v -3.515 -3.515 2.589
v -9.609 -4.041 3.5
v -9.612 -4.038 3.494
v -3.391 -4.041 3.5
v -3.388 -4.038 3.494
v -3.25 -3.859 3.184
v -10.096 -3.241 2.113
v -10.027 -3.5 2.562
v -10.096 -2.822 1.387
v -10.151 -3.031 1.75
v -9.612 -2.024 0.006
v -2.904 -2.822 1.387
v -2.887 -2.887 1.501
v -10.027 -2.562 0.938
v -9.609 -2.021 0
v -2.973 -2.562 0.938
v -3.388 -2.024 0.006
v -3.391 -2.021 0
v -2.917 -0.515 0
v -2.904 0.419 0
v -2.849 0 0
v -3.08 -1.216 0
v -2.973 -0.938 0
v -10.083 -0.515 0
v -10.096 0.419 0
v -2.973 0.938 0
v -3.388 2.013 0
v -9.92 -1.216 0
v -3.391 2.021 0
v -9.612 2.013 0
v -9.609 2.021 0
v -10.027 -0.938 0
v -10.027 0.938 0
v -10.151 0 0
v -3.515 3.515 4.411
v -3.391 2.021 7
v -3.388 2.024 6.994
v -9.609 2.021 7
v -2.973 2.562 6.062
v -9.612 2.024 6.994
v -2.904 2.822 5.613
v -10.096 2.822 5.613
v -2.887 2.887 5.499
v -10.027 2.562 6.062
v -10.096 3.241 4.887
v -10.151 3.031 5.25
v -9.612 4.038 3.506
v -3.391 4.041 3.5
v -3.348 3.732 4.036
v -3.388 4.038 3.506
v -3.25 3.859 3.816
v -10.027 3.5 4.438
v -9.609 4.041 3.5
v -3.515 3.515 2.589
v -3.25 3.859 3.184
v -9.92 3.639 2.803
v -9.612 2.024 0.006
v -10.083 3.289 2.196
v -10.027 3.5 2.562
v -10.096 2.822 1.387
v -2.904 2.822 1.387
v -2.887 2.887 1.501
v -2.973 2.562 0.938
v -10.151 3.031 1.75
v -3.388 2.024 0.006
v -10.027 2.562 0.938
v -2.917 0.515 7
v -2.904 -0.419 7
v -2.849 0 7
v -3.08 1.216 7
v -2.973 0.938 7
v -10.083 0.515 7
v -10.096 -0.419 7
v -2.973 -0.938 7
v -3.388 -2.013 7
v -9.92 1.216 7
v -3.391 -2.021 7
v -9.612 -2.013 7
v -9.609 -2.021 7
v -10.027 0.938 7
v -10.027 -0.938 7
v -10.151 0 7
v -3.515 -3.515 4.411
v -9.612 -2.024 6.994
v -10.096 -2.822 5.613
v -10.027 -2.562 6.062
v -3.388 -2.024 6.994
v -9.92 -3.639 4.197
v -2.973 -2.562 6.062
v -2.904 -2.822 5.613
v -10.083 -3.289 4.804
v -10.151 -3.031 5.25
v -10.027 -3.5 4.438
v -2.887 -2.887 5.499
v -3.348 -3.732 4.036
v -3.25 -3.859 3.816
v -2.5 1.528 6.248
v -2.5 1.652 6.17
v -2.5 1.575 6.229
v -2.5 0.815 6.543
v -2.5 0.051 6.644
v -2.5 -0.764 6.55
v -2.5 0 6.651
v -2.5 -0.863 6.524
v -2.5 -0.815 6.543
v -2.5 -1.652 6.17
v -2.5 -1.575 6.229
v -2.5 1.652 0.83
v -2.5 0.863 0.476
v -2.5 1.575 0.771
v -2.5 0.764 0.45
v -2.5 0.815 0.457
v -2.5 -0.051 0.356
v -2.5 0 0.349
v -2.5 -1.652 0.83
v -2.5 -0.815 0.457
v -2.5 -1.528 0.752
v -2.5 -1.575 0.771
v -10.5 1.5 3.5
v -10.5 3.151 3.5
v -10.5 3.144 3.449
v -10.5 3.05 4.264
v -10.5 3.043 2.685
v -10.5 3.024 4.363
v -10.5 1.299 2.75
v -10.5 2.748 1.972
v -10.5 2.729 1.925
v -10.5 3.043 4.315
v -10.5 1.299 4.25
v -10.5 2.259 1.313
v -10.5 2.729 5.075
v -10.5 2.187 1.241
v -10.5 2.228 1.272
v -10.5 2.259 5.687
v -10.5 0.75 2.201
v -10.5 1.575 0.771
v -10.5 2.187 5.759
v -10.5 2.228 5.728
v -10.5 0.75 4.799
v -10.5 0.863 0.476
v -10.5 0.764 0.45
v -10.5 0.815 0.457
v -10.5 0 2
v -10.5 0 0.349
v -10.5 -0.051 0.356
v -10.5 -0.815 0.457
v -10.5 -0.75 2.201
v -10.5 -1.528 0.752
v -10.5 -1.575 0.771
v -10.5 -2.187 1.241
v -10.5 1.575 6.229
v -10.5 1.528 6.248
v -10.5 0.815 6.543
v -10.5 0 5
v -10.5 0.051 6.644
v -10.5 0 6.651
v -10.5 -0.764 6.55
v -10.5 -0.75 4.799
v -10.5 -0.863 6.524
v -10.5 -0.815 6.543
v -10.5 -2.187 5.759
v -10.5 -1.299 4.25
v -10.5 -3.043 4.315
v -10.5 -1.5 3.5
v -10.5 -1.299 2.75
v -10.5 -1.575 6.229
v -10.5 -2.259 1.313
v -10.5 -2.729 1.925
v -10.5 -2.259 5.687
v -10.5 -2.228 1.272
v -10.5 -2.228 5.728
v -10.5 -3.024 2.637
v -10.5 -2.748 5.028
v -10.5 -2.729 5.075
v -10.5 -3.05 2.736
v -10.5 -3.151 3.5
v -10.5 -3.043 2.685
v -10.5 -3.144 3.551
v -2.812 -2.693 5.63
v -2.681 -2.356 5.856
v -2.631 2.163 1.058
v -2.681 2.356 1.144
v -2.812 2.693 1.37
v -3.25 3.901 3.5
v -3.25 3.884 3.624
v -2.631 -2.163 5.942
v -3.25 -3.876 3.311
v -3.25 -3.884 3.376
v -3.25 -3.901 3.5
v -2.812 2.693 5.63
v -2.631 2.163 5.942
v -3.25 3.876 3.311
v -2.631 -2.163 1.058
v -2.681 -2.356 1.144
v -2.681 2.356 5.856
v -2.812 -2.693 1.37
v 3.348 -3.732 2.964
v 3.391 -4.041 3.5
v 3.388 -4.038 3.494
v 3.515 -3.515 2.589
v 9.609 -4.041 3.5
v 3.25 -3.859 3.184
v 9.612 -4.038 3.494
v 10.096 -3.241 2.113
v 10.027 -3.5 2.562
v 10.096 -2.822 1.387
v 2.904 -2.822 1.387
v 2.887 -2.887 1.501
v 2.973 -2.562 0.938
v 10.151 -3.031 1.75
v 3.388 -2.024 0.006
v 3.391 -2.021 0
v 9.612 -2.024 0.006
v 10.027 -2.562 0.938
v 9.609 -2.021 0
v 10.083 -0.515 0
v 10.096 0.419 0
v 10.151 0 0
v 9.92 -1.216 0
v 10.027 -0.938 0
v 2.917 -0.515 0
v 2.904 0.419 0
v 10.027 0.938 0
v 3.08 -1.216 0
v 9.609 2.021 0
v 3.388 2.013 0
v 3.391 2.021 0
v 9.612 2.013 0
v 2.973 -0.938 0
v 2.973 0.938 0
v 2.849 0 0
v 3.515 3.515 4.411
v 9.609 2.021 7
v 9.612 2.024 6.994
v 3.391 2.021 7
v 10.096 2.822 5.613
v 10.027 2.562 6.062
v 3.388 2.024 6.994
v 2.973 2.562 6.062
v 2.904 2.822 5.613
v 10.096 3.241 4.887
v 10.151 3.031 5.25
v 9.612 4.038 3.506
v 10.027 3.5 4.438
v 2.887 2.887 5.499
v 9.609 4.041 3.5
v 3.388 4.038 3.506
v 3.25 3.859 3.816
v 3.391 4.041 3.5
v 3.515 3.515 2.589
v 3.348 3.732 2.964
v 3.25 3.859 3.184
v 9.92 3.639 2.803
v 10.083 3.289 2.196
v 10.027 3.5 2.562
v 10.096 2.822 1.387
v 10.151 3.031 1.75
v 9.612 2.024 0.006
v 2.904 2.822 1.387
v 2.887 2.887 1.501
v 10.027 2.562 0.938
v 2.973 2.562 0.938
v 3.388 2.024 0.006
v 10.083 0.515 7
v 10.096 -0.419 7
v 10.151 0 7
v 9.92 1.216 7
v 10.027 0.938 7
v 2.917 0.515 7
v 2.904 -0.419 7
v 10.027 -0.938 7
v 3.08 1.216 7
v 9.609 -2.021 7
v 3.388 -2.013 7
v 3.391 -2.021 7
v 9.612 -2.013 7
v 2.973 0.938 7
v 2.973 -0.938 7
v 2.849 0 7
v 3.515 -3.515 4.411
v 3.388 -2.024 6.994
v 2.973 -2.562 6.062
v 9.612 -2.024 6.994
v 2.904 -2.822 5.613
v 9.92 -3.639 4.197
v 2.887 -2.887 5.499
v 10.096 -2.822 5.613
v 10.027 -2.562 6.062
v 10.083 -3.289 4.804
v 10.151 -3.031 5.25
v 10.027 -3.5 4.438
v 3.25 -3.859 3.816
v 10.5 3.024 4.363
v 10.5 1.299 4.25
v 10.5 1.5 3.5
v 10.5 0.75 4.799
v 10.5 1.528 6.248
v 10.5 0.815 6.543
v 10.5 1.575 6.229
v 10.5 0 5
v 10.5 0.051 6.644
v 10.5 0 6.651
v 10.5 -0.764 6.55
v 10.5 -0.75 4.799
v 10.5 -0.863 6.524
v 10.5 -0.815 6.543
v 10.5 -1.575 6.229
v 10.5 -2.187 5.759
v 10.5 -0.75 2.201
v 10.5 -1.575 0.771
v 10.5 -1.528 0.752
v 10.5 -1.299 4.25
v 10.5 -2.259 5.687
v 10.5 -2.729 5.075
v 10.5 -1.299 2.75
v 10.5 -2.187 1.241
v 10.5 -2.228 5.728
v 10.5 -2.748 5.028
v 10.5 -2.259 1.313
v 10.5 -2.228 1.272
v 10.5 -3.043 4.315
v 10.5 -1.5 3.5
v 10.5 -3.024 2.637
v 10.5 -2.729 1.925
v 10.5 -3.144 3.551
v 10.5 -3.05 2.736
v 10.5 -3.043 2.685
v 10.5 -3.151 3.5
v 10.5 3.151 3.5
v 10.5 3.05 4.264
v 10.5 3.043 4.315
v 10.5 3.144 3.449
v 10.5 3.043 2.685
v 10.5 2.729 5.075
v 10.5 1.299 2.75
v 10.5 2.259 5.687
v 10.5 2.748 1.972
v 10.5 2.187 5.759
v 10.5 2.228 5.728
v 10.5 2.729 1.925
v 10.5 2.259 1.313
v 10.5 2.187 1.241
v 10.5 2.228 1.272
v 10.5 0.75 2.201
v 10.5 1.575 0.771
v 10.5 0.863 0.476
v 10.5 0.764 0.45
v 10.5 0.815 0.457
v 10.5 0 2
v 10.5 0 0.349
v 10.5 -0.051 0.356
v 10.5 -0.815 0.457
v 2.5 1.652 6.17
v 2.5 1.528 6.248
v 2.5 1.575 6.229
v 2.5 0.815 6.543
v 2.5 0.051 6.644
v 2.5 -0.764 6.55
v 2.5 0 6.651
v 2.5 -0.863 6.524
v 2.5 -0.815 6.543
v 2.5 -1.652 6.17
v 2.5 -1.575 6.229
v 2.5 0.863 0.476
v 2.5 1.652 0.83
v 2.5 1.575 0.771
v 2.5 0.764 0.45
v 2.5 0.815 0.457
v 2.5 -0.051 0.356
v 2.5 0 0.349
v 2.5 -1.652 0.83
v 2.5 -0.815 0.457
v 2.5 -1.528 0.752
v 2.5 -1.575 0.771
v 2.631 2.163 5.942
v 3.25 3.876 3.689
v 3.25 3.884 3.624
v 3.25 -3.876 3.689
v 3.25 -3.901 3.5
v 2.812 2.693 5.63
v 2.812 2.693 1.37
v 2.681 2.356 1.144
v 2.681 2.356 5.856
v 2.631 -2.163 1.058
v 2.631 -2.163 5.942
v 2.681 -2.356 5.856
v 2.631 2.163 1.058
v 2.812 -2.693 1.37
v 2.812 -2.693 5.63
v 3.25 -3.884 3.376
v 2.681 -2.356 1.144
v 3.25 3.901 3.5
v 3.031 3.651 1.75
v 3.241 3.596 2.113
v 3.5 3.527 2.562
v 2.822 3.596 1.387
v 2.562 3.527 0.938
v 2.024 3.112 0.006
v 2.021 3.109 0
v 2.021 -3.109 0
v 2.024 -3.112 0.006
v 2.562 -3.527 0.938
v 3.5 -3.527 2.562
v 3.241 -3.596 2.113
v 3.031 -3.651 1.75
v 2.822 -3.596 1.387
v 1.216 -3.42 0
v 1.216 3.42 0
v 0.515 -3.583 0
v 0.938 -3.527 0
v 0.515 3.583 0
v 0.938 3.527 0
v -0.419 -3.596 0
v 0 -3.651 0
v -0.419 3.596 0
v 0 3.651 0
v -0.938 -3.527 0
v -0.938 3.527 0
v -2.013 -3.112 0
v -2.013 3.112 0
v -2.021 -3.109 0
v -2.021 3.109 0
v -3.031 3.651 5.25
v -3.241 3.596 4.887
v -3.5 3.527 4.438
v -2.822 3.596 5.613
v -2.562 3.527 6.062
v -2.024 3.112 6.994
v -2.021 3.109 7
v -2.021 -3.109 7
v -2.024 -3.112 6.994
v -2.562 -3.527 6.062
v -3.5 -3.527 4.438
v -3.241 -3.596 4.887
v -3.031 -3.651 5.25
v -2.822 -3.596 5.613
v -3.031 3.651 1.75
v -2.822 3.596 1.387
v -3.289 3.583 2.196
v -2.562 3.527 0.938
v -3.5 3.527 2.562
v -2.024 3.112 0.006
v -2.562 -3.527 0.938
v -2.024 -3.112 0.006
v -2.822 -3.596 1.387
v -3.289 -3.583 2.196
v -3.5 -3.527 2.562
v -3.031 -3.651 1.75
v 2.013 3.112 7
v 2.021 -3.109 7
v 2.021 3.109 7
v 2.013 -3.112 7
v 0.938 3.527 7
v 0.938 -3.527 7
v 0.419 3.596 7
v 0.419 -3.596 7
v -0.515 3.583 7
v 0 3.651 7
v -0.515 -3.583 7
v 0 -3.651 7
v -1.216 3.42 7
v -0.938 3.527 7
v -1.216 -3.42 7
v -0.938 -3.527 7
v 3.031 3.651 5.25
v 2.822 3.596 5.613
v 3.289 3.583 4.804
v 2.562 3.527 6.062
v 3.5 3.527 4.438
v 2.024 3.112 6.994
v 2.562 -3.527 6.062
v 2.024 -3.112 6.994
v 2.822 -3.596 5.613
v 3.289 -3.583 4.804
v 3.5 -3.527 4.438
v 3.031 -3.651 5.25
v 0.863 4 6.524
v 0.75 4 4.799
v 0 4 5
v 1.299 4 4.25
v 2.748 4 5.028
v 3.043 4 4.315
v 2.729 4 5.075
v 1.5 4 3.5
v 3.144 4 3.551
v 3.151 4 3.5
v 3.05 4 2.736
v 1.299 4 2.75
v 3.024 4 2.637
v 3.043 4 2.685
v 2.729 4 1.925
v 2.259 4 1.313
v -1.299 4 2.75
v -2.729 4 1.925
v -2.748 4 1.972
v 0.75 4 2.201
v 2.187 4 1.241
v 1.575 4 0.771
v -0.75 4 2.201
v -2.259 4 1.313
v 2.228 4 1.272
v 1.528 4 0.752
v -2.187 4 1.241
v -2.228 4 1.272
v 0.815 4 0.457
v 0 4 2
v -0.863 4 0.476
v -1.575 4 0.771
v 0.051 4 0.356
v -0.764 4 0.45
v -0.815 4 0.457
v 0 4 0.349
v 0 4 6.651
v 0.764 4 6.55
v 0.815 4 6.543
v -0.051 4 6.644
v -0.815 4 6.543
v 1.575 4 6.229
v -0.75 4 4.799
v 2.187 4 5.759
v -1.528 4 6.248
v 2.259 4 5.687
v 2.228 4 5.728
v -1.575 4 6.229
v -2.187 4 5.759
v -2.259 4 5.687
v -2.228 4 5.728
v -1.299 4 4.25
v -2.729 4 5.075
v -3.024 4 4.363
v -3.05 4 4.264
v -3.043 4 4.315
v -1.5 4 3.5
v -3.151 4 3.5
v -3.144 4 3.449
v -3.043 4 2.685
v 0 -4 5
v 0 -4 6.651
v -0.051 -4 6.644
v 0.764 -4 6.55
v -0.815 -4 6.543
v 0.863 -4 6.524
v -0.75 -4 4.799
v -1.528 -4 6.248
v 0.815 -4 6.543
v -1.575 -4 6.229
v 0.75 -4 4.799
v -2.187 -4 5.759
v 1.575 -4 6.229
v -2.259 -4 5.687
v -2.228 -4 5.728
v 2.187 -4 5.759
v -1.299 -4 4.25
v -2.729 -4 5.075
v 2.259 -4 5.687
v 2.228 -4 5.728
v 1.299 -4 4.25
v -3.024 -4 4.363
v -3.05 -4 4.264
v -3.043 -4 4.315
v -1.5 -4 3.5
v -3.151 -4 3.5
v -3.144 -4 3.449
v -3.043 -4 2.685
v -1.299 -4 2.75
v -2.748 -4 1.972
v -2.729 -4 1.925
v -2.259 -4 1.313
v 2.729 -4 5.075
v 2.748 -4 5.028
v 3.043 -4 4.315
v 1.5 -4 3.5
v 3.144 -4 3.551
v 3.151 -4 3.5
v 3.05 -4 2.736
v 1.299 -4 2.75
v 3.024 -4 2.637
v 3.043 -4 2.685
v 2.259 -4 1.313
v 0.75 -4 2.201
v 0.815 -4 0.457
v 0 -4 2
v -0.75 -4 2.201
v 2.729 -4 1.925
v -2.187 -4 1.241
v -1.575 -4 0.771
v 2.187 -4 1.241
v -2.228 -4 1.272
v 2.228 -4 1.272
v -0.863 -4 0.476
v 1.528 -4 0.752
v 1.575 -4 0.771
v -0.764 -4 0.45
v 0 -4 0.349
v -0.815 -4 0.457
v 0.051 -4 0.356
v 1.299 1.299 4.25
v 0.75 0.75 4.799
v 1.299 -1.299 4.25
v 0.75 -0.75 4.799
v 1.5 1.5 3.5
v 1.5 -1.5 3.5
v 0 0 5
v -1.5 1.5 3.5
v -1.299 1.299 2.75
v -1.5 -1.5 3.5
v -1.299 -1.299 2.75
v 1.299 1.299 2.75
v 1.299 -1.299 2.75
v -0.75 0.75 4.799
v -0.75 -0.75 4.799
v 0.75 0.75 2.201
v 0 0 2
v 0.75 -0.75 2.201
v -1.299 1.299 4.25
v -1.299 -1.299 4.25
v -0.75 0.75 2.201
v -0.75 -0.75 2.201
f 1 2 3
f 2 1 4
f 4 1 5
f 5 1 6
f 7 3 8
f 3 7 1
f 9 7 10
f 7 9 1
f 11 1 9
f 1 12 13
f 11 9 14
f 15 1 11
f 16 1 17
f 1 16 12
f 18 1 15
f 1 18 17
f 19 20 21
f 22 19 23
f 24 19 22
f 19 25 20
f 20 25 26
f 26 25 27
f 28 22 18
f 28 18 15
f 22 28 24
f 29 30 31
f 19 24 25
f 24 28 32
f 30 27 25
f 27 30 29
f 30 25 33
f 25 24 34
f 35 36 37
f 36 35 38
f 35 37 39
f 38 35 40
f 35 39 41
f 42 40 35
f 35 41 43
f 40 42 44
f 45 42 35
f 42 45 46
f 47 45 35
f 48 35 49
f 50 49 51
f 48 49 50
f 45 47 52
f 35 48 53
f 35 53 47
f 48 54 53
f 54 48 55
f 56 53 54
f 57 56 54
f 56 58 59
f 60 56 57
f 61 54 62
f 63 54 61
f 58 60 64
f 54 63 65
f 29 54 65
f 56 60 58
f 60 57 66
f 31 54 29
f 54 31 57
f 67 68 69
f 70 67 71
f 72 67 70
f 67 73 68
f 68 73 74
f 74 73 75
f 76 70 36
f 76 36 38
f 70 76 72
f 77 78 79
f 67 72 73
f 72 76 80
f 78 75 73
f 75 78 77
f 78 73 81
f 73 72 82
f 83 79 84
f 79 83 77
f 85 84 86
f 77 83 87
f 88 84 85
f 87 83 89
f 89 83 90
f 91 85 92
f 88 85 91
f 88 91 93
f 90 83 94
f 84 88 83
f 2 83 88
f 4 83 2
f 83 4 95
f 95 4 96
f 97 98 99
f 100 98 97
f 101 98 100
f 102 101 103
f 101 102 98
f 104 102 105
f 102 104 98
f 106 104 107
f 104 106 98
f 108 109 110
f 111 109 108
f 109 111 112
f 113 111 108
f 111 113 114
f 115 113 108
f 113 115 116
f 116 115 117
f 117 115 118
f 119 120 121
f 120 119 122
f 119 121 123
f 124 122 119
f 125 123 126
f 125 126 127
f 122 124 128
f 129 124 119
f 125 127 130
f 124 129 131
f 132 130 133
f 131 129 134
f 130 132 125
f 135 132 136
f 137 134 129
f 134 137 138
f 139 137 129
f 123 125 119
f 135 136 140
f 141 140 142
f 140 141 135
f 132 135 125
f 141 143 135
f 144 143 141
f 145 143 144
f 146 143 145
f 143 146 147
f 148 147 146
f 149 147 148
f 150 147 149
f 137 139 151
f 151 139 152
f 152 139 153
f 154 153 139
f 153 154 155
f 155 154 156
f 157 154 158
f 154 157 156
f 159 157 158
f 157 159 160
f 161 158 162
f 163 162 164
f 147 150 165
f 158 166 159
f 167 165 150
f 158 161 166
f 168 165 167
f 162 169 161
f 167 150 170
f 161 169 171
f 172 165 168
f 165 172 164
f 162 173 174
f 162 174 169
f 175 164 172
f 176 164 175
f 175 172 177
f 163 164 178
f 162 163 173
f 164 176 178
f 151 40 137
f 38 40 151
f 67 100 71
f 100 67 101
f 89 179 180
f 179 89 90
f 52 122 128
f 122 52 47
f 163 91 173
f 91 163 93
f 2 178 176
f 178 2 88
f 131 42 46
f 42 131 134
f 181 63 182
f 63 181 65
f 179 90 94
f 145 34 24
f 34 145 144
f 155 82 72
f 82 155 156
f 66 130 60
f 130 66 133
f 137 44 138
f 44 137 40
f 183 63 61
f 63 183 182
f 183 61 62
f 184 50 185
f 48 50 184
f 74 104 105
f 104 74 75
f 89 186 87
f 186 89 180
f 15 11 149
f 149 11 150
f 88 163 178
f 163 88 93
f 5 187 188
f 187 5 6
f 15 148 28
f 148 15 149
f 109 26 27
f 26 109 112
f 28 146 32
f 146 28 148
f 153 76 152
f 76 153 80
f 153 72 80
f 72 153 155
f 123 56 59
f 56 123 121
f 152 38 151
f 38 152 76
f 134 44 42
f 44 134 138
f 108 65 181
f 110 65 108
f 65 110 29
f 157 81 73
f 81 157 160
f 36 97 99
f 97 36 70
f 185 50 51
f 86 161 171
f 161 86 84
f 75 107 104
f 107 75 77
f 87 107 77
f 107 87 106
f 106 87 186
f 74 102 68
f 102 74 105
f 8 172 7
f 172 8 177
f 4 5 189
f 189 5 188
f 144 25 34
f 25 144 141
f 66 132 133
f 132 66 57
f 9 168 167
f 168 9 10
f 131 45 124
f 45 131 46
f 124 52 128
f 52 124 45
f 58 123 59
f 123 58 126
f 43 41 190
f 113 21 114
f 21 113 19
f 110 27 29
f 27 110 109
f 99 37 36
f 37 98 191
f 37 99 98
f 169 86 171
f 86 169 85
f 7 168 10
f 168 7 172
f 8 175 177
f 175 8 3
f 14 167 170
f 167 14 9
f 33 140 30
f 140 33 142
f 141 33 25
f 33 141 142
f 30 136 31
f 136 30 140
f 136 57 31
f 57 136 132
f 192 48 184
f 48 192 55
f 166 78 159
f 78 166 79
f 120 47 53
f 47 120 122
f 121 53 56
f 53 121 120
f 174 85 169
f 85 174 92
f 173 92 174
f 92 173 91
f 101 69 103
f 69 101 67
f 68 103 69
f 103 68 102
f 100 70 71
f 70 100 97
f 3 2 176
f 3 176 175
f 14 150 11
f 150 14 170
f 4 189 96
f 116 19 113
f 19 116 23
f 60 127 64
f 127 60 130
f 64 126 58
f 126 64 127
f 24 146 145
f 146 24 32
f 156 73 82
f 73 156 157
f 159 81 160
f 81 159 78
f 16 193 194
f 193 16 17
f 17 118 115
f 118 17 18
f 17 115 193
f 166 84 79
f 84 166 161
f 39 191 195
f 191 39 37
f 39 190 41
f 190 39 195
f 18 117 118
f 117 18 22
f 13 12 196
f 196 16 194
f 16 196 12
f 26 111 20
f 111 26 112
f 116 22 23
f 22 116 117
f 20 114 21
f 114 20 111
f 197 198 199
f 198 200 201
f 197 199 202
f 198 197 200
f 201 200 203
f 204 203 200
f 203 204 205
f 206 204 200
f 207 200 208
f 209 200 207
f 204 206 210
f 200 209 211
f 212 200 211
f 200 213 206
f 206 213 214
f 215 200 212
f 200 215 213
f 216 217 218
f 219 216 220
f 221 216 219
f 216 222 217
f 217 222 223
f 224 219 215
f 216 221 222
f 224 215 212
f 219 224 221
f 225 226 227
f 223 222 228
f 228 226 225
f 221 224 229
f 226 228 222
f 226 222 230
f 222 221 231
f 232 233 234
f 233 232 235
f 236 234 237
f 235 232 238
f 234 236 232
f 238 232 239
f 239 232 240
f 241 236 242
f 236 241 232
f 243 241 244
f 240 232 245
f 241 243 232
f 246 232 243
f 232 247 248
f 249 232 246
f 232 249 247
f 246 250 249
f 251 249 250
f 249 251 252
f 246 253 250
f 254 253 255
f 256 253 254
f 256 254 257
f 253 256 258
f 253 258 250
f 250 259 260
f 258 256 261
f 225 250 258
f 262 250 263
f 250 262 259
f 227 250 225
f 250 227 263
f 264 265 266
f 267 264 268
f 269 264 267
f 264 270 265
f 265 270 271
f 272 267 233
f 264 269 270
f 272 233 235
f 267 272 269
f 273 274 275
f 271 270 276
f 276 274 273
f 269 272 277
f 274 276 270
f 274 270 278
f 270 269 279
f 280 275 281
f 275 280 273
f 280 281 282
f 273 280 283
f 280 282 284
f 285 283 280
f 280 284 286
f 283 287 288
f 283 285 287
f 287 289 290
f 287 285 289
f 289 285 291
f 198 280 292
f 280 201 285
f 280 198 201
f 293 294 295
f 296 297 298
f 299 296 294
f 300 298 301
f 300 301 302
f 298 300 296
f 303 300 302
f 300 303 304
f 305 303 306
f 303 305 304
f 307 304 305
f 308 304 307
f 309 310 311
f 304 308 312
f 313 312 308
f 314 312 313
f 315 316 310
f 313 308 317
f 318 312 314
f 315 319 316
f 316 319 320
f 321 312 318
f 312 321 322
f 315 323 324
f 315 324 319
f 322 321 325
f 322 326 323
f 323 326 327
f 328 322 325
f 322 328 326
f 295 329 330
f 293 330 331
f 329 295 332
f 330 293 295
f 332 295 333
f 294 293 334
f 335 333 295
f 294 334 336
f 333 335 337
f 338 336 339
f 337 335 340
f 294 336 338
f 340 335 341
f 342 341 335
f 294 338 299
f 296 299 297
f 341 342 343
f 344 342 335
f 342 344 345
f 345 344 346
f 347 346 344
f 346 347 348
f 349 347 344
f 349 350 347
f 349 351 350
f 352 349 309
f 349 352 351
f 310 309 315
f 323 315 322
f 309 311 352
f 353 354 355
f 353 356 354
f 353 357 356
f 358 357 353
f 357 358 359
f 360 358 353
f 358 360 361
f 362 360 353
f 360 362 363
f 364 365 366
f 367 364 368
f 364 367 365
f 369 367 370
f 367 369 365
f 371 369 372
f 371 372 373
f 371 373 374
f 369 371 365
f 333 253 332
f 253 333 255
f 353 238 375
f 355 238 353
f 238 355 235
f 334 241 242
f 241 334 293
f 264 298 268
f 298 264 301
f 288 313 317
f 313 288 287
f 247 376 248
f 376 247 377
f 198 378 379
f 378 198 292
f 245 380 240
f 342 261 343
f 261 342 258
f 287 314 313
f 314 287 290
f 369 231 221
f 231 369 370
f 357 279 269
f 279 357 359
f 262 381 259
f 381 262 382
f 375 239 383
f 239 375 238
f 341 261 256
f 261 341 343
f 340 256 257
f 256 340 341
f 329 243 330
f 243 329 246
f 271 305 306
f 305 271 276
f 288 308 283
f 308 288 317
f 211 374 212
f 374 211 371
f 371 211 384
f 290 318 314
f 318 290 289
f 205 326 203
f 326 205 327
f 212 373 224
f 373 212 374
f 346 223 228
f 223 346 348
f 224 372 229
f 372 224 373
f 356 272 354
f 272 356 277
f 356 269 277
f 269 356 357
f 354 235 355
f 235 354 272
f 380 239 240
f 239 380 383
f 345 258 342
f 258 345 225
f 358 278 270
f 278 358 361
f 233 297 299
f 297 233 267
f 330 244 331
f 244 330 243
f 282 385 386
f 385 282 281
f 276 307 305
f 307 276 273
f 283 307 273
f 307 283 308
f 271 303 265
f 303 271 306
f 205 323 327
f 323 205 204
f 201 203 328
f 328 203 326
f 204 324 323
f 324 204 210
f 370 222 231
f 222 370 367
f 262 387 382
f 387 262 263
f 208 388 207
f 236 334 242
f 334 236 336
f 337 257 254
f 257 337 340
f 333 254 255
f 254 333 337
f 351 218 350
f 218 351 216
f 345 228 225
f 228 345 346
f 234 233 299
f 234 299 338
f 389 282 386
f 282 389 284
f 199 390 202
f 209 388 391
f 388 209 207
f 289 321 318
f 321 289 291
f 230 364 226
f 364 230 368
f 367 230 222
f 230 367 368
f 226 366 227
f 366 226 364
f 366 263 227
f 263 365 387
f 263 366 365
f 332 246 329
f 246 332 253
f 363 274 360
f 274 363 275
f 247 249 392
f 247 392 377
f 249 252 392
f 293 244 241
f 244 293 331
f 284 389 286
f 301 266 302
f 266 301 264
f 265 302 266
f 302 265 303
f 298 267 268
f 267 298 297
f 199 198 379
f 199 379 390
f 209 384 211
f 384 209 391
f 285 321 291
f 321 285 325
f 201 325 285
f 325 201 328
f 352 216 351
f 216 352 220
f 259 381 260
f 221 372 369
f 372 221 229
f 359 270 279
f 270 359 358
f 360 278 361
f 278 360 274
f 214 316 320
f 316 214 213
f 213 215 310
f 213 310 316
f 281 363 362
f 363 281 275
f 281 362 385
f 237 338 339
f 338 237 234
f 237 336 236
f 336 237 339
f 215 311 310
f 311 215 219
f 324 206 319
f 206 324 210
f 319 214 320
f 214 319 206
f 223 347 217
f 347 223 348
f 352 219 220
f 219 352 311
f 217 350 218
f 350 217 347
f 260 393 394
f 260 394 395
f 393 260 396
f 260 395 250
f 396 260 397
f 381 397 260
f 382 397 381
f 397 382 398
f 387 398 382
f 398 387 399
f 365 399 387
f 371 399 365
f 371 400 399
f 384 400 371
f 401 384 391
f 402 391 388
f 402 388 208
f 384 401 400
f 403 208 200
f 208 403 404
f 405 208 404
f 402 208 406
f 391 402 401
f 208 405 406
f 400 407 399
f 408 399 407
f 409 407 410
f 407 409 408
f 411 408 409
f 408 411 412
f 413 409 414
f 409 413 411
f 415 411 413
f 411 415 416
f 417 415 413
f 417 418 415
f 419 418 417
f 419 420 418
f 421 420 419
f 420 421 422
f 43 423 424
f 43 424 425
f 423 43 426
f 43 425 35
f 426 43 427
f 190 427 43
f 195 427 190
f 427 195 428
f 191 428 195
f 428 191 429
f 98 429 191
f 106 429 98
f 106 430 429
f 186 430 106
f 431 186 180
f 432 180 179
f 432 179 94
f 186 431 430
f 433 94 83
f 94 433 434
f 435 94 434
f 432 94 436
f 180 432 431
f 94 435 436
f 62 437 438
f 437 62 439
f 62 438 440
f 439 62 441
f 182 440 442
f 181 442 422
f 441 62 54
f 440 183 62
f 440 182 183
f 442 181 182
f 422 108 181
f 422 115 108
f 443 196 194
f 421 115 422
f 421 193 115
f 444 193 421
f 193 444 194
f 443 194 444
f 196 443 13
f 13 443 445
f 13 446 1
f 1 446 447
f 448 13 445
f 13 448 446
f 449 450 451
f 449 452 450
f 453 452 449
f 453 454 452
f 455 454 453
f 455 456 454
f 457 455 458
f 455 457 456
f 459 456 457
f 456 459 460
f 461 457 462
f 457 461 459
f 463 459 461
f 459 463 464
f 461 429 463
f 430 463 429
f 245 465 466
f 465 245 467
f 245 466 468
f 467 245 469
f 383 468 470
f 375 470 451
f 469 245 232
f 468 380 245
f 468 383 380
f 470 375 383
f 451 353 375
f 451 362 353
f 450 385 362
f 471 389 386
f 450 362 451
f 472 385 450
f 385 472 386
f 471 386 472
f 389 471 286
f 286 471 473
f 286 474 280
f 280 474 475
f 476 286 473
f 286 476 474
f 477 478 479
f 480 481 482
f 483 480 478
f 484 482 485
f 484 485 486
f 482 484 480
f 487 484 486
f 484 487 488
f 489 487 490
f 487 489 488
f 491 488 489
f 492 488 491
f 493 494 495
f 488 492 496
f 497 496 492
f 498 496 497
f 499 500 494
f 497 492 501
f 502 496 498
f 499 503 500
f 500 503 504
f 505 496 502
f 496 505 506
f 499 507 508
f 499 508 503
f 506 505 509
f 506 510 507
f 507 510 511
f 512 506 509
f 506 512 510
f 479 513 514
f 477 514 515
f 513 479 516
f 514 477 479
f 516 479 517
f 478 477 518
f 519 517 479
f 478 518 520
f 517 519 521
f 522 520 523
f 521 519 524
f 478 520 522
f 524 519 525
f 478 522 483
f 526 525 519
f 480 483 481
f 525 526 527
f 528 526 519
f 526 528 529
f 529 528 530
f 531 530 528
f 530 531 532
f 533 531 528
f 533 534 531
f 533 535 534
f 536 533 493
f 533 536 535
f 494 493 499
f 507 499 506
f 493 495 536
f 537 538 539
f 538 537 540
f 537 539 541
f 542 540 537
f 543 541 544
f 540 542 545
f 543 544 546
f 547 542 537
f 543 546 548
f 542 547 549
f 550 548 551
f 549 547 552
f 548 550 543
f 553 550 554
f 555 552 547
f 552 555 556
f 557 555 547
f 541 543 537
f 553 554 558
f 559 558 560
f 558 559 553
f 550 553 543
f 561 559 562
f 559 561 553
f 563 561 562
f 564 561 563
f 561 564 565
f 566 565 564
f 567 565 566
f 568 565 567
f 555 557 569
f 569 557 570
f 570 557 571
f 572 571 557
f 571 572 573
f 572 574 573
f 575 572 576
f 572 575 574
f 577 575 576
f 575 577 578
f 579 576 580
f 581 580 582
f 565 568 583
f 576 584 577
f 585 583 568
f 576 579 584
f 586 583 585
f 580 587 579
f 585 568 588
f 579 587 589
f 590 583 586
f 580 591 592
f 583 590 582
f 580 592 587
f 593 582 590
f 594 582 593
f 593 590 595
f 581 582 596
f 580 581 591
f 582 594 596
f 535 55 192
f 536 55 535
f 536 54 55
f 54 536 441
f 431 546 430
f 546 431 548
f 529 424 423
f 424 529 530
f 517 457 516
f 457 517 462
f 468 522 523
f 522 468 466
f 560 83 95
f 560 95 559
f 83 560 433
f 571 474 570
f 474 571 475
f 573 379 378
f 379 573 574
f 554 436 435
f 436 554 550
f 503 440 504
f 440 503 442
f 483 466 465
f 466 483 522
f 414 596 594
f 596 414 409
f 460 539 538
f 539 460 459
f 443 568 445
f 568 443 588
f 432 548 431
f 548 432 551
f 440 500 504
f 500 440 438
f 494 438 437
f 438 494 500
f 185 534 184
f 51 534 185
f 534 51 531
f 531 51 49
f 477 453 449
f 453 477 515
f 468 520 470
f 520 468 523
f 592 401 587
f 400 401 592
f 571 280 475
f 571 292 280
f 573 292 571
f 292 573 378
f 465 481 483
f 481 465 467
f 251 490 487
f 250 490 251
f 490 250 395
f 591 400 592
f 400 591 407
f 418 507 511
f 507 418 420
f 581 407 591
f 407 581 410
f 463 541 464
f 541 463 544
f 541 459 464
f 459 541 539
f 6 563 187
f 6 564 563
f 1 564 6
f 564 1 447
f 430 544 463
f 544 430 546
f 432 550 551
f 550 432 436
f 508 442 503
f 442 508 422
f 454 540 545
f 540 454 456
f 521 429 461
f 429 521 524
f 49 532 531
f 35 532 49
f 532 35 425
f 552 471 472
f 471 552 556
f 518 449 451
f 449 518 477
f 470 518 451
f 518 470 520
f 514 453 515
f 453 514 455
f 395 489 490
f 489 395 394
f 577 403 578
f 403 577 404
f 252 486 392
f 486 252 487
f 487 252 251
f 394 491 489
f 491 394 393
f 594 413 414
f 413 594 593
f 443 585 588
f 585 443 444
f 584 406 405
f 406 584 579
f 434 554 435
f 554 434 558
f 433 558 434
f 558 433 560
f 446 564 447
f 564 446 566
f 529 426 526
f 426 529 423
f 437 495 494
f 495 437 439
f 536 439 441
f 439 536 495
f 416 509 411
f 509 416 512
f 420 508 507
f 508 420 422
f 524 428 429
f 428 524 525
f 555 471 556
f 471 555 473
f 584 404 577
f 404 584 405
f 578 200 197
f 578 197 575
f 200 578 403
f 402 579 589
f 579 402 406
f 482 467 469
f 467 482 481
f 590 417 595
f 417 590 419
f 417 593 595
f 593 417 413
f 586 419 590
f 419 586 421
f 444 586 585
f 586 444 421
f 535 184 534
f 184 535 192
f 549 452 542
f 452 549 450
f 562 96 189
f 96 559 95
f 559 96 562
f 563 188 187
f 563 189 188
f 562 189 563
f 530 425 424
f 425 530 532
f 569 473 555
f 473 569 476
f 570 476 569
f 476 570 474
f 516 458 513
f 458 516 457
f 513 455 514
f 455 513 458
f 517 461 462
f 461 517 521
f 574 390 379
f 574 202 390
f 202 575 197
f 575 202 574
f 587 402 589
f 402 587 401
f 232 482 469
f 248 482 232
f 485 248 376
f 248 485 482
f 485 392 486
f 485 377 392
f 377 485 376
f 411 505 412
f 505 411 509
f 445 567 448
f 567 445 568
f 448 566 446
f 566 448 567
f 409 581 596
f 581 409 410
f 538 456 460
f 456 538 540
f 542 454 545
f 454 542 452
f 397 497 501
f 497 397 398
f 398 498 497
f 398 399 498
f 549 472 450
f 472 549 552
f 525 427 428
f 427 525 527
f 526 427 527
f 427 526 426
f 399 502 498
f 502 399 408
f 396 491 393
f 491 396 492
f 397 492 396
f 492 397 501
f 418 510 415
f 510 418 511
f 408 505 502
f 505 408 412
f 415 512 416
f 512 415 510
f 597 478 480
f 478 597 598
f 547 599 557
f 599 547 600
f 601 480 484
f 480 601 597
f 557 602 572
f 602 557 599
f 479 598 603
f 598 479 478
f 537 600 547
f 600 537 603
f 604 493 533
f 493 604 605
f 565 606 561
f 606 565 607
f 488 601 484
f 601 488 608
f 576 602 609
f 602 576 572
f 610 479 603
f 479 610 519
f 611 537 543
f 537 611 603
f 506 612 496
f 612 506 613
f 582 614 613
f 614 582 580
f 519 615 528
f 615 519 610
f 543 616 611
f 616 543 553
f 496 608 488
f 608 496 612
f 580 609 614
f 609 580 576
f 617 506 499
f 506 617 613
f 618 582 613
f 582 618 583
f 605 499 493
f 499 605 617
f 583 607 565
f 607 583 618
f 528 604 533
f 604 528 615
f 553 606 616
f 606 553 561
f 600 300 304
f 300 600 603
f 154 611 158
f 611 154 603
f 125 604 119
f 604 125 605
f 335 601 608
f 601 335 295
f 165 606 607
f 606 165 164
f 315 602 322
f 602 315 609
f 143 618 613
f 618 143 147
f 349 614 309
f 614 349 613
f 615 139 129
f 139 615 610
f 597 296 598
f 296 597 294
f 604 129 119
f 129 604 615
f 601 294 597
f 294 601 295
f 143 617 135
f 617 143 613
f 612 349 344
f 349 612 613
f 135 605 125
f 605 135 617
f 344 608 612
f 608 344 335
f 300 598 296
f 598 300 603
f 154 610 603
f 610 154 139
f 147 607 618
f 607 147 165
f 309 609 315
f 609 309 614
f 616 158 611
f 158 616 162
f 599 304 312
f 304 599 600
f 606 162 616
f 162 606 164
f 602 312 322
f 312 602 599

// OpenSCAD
h = 7;
r = h/2 / cos(30);

module stumpy() {
  rotate([0, 90, 0]) rotate([0, 0, 30]) intersection() {
    cylinder(r=r, h=8, center=true, $fn=6);
    sphere(r=5.1, $fn=24);
  }
}

module middle() {
  difference() {
    union() {
      translate([-6.5, 0, 0]) stumpy();
      translate([6.5, 0, 0]) stumpy();
      rotate([0, 0, 90]) stumpy();
    }
    rotate([90, 0, 0]) cylinder(r=1.5, h=30, center=true, $fn=12);
    rotate([0, 90, 0]) cylinder(r=1.5, h=30, center=true, $fn=12);
  }
}

translate([0, 0, h/2]) middle();
